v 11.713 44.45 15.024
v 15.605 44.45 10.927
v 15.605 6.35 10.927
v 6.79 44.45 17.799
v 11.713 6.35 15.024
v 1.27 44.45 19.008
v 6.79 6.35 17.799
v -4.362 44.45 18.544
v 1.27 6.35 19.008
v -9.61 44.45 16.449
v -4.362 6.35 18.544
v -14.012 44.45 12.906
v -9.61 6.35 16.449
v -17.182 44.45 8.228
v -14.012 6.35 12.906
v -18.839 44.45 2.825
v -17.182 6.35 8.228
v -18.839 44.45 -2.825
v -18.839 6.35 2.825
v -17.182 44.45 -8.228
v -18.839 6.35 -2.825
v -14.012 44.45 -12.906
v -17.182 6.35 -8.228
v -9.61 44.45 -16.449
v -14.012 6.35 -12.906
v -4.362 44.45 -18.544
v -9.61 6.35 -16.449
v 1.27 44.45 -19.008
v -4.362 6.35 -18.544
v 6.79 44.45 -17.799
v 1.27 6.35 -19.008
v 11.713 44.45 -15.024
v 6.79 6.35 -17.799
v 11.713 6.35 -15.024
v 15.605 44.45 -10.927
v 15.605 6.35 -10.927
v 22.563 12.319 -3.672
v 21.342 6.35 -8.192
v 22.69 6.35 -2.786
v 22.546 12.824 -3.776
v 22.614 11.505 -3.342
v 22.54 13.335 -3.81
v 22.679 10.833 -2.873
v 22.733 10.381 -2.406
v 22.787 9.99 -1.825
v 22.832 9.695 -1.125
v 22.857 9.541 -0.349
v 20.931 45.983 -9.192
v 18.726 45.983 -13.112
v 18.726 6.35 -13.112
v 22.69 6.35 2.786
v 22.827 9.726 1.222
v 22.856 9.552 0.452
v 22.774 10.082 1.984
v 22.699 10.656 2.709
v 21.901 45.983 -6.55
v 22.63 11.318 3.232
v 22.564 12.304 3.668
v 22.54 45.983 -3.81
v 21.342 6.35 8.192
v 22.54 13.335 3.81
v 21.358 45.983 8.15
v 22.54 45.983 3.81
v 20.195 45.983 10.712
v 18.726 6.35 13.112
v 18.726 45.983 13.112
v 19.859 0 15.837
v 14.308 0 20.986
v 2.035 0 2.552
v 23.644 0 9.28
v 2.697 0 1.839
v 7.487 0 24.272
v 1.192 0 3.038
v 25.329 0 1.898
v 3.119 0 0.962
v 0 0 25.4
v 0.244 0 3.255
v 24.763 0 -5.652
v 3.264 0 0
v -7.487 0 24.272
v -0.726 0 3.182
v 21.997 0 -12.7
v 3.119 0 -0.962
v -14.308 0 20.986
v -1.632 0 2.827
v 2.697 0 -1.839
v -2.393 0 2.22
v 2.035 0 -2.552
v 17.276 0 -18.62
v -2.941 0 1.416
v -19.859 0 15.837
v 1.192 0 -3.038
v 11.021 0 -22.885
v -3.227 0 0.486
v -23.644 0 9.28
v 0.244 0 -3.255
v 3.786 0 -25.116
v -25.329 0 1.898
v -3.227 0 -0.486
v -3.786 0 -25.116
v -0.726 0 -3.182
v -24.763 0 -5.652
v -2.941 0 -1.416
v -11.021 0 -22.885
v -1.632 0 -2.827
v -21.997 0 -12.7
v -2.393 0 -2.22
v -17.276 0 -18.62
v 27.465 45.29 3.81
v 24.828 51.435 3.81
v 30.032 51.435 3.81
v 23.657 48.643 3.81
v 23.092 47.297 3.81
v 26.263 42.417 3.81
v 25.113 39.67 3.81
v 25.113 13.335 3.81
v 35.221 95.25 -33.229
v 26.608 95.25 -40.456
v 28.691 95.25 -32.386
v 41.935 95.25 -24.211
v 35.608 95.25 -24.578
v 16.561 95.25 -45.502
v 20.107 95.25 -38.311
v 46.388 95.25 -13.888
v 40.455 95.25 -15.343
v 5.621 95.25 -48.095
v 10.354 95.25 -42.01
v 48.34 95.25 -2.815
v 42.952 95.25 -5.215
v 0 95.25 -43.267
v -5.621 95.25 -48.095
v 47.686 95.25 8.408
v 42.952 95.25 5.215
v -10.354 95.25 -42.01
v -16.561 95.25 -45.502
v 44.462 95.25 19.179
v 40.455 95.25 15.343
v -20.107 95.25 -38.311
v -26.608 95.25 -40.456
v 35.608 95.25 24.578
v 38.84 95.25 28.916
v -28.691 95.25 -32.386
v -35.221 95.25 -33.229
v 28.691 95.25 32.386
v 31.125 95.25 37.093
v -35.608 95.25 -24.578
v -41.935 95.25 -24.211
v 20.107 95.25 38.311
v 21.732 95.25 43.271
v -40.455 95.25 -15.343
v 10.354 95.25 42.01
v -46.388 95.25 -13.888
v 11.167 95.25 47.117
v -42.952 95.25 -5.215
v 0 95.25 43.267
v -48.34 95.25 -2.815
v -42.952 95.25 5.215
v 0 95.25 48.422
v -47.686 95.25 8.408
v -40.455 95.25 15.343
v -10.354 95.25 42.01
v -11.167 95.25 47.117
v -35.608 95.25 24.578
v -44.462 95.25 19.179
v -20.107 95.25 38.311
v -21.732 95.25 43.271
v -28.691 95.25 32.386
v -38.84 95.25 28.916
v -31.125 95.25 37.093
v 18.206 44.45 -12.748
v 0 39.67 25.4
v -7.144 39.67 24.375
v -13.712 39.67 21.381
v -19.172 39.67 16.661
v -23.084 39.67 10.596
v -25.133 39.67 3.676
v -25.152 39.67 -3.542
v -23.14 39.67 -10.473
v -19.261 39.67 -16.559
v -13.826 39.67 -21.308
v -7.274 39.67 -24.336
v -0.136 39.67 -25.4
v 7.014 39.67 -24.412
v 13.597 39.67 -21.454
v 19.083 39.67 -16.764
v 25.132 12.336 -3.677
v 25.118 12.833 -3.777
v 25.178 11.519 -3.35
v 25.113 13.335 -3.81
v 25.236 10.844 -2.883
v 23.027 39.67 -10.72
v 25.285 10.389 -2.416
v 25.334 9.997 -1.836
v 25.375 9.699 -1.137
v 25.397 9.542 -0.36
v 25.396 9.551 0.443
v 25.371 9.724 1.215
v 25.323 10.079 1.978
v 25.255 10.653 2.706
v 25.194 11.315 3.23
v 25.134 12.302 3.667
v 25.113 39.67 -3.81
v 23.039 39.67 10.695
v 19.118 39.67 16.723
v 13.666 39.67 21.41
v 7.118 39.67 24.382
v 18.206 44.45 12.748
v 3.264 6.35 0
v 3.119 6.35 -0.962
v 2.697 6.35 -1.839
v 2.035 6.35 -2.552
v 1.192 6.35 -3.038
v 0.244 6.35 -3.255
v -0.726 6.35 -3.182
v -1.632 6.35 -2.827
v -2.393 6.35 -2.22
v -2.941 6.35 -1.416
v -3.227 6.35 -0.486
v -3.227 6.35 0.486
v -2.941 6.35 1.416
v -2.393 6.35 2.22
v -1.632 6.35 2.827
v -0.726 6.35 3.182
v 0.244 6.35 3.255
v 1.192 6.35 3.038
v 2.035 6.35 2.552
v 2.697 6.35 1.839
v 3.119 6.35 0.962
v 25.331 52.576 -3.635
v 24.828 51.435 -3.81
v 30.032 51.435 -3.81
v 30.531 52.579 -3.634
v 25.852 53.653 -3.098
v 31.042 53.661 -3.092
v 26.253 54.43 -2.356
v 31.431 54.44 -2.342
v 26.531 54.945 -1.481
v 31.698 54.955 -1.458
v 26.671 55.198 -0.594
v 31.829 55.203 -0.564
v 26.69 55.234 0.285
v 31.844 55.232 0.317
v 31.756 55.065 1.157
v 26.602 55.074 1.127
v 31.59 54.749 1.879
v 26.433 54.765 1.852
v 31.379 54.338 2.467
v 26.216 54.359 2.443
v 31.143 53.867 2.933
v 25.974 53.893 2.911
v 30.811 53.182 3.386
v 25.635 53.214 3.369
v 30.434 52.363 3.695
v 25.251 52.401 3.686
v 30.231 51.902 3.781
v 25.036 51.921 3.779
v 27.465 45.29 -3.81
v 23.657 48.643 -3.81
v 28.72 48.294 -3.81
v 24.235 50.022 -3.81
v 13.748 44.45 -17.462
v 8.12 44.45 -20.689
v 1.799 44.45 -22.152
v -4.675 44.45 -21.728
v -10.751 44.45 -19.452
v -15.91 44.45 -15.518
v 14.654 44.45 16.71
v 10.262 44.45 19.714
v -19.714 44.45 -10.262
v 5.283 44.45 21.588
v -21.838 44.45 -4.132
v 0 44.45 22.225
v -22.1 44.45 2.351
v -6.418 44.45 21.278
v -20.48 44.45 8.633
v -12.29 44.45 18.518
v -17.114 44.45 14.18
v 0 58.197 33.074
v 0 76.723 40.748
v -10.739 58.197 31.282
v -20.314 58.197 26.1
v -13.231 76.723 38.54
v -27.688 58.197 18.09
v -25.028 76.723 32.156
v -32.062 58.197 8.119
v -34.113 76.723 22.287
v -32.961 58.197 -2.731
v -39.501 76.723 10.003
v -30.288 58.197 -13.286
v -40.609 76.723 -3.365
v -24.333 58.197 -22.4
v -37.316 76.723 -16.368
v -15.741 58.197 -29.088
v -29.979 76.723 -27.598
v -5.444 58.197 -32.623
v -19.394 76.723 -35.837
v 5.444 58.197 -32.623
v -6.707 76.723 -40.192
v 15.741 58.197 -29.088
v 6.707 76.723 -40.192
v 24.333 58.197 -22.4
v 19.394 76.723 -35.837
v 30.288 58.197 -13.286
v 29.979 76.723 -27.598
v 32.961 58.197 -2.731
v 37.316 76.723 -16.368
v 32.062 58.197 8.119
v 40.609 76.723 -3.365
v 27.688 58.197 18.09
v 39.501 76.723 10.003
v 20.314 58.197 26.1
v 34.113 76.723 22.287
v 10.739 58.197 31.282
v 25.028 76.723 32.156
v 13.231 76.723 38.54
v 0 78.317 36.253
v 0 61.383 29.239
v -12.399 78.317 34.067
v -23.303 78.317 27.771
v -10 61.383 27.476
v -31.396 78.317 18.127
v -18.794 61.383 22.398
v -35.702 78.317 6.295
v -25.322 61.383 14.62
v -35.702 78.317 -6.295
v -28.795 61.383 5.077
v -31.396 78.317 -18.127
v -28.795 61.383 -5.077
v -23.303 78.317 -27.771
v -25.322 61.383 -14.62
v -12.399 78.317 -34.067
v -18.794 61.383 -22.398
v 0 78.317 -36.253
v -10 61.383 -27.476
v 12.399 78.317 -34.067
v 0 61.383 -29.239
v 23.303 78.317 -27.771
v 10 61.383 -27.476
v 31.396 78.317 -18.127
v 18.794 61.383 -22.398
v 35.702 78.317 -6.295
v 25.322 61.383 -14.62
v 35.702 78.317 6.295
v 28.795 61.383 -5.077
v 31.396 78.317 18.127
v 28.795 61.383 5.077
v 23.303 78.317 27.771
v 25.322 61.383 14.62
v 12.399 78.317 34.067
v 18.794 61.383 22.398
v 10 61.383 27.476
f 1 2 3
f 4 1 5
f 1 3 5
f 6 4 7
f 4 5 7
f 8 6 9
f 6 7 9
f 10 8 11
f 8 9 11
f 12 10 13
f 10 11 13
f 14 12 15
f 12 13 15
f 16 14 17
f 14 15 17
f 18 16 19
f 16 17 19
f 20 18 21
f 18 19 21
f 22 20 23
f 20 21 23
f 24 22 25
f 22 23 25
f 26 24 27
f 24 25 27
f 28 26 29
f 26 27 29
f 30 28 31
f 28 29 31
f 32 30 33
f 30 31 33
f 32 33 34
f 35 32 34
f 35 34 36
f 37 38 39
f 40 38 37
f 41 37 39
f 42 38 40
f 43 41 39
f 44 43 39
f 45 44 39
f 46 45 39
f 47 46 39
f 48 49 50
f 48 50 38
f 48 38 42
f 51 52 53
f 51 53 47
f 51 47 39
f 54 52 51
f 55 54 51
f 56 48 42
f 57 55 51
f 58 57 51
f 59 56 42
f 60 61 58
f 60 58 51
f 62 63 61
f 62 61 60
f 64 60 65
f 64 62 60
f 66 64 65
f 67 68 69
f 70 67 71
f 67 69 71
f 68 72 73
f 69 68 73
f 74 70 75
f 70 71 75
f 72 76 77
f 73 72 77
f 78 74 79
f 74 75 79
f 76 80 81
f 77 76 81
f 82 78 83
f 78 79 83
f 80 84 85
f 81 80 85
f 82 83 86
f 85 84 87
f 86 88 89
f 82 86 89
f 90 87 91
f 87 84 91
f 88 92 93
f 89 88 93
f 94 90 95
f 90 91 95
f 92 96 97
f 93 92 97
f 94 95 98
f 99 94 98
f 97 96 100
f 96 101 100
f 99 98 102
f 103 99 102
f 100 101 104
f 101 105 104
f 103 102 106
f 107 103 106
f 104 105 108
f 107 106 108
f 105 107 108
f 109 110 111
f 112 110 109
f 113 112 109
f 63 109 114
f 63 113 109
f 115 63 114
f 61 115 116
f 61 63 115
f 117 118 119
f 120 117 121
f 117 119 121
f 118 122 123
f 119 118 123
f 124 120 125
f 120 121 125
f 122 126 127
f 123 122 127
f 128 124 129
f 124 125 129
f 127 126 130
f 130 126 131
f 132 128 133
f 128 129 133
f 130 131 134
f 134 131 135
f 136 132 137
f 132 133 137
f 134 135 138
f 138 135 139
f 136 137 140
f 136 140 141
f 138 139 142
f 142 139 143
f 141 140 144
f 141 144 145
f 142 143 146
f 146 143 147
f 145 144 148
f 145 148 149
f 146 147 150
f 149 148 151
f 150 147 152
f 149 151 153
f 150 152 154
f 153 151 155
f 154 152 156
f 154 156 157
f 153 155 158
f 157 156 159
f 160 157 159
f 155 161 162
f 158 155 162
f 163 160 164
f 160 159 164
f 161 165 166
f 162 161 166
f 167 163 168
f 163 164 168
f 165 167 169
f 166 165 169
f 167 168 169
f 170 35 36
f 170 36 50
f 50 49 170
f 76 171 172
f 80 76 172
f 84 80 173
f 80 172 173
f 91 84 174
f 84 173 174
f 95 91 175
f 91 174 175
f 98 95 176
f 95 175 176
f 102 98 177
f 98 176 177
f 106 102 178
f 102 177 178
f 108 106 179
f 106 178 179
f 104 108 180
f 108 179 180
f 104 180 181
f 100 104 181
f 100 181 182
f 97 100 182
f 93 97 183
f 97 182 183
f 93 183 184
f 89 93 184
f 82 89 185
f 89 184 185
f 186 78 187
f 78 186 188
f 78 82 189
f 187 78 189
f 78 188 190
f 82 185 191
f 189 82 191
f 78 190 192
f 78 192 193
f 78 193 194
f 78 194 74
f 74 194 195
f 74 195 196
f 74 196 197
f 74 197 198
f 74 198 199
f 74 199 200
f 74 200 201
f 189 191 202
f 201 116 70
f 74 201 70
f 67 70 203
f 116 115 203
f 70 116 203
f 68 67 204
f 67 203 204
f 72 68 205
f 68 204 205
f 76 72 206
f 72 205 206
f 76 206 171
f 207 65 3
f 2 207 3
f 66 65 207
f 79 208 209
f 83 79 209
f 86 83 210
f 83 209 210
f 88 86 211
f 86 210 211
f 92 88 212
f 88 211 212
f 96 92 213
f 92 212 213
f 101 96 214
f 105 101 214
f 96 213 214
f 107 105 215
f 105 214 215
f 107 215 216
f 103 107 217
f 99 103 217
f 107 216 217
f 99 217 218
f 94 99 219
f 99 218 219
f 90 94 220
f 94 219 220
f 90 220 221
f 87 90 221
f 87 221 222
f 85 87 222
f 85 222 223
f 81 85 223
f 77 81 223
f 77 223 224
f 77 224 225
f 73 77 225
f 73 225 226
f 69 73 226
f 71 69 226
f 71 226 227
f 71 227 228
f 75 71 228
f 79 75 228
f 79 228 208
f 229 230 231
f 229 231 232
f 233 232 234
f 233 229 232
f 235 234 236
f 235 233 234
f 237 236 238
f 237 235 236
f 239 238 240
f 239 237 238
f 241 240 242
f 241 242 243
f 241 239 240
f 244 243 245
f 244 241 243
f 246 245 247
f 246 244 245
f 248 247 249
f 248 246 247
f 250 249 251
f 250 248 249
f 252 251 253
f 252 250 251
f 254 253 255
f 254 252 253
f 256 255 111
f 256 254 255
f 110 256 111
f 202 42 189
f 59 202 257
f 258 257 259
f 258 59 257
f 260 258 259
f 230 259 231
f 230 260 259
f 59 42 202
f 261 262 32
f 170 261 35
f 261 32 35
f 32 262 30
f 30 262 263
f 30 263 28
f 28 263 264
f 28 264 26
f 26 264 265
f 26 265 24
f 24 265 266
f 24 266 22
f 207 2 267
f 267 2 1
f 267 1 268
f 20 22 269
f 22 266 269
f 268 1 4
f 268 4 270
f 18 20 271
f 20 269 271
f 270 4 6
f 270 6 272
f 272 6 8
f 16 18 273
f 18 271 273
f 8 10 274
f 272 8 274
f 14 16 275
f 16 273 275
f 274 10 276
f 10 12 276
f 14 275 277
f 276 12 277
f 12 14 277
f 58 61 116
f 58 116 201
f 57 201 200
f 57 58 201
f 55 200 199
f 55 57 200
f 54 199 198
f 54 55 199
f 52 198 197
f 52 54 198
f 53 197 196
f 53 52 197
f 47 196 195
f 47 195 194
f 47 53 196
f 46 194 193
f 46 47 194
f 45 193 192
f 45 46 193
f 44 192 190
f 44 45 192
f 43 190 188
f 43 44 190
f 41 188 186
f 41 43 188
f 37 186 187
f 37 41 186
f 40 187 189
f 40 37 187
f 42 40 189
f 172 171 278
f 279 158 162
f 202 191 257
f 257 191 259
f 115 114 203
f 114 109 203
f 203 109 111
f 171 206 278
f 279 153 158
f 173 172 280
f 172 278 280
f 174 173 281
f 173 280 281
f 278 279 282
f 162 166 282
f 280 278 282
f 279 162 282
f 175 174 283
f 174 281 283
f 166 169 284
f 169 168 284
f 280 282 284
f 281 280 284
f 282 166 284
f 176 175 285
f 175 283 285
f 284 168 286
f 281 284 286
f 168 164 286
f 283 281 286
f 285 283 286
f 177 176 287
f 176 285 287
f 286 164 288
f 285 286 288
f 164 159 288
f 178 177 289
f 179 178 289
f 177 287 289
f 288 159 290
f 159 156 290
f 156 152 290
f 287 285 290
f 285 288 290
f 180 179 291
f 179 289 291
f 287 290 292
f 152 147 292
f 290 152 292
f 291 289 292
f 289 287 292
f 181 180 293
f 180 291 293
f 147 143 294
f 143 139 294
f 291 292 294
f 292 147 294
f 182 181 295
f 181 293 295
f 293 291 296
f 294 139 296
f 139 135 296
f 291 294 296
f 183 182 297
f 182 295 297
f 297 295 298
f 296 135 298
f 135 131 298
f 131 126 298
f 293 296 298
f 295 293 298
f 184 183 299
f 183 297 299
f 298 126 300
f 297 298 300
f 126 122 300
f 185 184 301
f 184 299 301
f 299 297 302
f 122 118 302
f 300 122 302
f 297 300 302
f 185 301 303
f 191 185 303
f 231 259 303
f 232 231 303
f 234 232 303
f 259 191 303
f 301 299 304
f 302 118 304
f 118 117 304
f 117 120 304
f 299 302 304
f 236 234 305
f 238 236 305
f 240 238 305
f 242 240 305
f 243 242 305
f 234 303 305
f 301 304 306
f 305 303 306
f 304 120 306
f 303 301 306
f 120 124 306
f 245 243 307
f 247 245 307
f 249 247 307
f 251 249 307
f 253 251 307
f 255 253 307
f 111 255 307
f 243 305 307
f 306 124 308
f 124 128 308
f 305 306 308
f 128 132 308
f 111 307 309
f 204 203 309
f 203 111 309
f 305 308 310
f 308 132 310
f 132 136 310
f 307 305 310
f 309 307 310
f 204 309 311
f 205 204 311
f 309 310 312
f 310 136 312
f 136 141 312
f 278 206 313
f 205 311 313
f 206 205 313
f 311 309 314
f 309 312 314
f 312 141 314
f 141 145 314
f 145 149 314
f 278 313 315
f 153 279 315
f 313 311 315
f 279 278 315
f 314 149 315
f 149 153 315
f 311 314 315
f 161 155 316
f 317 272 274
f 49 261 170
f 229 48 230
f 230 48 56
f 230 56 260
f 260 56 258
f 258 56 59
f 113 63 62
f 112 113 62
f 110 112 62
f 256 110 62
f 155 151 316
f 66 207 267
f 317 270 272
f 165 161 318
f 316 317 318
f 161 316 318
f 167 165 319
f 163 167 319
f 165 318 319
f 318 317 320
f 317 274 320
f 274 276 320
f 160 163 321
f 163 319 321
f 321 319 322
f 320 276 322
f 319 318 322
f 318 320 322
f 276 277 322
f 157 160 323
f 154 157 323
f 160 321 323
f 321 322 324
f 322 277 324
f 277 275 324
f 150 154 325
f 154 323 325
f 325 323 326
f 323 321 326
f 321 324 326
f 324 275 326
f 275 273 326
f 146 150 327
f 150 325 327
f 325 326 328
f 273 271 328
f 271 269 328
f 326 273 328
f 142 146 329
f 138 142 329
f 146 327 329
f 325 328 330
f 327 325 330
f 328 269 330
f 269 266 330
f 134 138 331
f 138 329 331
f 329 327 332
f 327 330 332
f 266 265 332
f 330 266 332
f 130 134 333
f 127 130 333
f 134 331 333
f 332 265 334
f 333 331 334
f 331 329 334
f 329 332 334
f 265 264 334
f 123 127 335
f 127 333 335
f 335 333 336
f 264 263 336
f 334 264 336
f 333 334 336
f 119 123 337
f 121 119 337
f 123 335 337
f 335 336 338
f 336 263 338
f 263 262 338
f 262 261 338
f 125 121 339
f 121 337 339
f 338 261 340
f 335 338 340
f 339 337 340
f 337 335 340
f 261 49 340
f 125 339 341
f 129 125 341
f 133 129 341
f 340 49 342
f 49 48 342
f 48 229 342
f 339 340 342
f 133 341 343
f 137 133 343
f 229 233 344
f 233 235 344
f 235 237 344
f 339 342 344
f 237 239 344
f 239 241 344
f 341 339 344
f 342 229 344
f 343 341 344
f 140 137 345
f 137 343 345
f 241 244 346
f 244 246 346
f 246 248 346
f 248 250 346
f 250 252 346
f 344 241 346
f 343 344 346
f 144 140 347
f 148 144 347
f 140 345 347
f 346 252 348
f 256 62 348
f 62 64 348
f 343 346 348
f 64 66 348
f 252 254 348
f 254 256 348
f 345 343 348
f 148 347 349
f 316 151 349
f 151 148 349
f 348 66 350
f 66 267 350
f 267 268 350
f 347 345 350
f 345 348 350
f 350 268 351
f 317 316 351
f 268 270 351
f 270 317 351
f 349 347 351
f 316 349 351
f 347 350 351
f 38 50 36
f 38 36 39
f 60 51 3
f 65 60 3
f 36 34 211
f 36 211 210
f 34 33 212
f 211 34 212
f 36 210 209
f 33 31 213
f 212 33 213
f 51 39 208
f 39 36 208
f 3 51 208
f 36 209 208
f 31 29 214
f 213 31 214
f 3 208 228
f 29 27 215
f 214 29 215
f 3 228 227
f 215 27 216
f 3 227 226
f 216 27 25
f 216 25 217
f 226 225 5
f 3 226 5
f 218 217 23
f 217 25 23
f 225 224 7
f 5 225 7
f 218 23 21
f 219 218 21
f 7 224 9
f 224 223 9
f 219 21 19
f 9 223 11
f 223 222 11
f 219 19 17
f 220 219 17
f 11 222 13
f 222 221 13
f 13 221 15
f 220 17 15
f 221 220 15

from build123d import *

# Parameters (mm, degrees)
CUT_EXTRUDE1_DEPTH       = 118.311258623
F_0_257_DIAMETER_HOLE1_D = 6.5278
CUT_EXTRUDE2_DEPTH       = 38.1


with BuildPart() as part:
    # Sketch2 → Revolve1 (revolve)
    with BuildSketch(Plane.XY, mode=Mode.PRIVATE) as revolve1_sk:
        Polygon((0, 0), (-25.4, 0), (-25.4, 39.67011582), (-48.421941822, 95.25), (-43.267048969, 95.25), (-22.225, 44.45), (-19.05, 44.45), (-19.05, 6.35), (0, 6.35), align=None)
    revolve(revolve1_sk.sketch.rotate(Axis((0, 0, 0), (0, -1, 0)), 270), axis=Axis((0, 0, 0), (0, -1, 0)))

    # Sketch3 → Cut-Extrude1 (cut, through all)
    with BuildSketch(Plane(origin=(0, 0, 0), x_dir=(0, 0, -1), z_dir=(1, 0, 0))):
        with BuildLine():
            Line((-3.81, 51.435), (-3.81, 13.335))
            ThreePointArc((-3.81, 13.335), (0, 9.525), (3.81, 13.335))
            Line((3.81, 13.335), (3.81, 51.435))
            ThreePointArc((3.81, 51.435), (0, 55.245), (-3.81, 51.435))
        make_face()
    extrude(amount=CUT_EXTRUDE1_DEPTH, mode=Mode.SUBTRACT)

    # F (0.257) Diameter Hole1 (through all)
    with Locations(Plane(origin=(0, 0, 0), x_dir=(-1, 0, 0), z_dir=(0, -1, 0))):
        with Locations((0, 0)):
            Hole(F_0_257_DIAMETER_HOLE1_D / 2)

    # Sketch8 → Cut-Extrude2 (cut, symmetric)
    with BuildSketch(Plane(origin=(0, 44.45, 0), x_dir=(1, 0, 0), z_dir=(0, 1, 0))):
        with BuildLine():
            Line((15.604846444, 10.926631112), (18.725815732, 13.111957335))
            ThreePointArc((18.725815732, 13.111957335), (22.86, 0), (18.725815732, -13.111957335))
            Line((18.725815732, -13.111957335), (15.604846444, -10.926631112))
            ThreePointArc((15.604846444, -10.926631112), (19.05, 0), (15.604846444, 10.926631112))
        make_face()
    extrude(amount=CUT_EXTRUDE2_DEPTH, both=True, mode=Mode.SUBTRACT)


solid = part.part
